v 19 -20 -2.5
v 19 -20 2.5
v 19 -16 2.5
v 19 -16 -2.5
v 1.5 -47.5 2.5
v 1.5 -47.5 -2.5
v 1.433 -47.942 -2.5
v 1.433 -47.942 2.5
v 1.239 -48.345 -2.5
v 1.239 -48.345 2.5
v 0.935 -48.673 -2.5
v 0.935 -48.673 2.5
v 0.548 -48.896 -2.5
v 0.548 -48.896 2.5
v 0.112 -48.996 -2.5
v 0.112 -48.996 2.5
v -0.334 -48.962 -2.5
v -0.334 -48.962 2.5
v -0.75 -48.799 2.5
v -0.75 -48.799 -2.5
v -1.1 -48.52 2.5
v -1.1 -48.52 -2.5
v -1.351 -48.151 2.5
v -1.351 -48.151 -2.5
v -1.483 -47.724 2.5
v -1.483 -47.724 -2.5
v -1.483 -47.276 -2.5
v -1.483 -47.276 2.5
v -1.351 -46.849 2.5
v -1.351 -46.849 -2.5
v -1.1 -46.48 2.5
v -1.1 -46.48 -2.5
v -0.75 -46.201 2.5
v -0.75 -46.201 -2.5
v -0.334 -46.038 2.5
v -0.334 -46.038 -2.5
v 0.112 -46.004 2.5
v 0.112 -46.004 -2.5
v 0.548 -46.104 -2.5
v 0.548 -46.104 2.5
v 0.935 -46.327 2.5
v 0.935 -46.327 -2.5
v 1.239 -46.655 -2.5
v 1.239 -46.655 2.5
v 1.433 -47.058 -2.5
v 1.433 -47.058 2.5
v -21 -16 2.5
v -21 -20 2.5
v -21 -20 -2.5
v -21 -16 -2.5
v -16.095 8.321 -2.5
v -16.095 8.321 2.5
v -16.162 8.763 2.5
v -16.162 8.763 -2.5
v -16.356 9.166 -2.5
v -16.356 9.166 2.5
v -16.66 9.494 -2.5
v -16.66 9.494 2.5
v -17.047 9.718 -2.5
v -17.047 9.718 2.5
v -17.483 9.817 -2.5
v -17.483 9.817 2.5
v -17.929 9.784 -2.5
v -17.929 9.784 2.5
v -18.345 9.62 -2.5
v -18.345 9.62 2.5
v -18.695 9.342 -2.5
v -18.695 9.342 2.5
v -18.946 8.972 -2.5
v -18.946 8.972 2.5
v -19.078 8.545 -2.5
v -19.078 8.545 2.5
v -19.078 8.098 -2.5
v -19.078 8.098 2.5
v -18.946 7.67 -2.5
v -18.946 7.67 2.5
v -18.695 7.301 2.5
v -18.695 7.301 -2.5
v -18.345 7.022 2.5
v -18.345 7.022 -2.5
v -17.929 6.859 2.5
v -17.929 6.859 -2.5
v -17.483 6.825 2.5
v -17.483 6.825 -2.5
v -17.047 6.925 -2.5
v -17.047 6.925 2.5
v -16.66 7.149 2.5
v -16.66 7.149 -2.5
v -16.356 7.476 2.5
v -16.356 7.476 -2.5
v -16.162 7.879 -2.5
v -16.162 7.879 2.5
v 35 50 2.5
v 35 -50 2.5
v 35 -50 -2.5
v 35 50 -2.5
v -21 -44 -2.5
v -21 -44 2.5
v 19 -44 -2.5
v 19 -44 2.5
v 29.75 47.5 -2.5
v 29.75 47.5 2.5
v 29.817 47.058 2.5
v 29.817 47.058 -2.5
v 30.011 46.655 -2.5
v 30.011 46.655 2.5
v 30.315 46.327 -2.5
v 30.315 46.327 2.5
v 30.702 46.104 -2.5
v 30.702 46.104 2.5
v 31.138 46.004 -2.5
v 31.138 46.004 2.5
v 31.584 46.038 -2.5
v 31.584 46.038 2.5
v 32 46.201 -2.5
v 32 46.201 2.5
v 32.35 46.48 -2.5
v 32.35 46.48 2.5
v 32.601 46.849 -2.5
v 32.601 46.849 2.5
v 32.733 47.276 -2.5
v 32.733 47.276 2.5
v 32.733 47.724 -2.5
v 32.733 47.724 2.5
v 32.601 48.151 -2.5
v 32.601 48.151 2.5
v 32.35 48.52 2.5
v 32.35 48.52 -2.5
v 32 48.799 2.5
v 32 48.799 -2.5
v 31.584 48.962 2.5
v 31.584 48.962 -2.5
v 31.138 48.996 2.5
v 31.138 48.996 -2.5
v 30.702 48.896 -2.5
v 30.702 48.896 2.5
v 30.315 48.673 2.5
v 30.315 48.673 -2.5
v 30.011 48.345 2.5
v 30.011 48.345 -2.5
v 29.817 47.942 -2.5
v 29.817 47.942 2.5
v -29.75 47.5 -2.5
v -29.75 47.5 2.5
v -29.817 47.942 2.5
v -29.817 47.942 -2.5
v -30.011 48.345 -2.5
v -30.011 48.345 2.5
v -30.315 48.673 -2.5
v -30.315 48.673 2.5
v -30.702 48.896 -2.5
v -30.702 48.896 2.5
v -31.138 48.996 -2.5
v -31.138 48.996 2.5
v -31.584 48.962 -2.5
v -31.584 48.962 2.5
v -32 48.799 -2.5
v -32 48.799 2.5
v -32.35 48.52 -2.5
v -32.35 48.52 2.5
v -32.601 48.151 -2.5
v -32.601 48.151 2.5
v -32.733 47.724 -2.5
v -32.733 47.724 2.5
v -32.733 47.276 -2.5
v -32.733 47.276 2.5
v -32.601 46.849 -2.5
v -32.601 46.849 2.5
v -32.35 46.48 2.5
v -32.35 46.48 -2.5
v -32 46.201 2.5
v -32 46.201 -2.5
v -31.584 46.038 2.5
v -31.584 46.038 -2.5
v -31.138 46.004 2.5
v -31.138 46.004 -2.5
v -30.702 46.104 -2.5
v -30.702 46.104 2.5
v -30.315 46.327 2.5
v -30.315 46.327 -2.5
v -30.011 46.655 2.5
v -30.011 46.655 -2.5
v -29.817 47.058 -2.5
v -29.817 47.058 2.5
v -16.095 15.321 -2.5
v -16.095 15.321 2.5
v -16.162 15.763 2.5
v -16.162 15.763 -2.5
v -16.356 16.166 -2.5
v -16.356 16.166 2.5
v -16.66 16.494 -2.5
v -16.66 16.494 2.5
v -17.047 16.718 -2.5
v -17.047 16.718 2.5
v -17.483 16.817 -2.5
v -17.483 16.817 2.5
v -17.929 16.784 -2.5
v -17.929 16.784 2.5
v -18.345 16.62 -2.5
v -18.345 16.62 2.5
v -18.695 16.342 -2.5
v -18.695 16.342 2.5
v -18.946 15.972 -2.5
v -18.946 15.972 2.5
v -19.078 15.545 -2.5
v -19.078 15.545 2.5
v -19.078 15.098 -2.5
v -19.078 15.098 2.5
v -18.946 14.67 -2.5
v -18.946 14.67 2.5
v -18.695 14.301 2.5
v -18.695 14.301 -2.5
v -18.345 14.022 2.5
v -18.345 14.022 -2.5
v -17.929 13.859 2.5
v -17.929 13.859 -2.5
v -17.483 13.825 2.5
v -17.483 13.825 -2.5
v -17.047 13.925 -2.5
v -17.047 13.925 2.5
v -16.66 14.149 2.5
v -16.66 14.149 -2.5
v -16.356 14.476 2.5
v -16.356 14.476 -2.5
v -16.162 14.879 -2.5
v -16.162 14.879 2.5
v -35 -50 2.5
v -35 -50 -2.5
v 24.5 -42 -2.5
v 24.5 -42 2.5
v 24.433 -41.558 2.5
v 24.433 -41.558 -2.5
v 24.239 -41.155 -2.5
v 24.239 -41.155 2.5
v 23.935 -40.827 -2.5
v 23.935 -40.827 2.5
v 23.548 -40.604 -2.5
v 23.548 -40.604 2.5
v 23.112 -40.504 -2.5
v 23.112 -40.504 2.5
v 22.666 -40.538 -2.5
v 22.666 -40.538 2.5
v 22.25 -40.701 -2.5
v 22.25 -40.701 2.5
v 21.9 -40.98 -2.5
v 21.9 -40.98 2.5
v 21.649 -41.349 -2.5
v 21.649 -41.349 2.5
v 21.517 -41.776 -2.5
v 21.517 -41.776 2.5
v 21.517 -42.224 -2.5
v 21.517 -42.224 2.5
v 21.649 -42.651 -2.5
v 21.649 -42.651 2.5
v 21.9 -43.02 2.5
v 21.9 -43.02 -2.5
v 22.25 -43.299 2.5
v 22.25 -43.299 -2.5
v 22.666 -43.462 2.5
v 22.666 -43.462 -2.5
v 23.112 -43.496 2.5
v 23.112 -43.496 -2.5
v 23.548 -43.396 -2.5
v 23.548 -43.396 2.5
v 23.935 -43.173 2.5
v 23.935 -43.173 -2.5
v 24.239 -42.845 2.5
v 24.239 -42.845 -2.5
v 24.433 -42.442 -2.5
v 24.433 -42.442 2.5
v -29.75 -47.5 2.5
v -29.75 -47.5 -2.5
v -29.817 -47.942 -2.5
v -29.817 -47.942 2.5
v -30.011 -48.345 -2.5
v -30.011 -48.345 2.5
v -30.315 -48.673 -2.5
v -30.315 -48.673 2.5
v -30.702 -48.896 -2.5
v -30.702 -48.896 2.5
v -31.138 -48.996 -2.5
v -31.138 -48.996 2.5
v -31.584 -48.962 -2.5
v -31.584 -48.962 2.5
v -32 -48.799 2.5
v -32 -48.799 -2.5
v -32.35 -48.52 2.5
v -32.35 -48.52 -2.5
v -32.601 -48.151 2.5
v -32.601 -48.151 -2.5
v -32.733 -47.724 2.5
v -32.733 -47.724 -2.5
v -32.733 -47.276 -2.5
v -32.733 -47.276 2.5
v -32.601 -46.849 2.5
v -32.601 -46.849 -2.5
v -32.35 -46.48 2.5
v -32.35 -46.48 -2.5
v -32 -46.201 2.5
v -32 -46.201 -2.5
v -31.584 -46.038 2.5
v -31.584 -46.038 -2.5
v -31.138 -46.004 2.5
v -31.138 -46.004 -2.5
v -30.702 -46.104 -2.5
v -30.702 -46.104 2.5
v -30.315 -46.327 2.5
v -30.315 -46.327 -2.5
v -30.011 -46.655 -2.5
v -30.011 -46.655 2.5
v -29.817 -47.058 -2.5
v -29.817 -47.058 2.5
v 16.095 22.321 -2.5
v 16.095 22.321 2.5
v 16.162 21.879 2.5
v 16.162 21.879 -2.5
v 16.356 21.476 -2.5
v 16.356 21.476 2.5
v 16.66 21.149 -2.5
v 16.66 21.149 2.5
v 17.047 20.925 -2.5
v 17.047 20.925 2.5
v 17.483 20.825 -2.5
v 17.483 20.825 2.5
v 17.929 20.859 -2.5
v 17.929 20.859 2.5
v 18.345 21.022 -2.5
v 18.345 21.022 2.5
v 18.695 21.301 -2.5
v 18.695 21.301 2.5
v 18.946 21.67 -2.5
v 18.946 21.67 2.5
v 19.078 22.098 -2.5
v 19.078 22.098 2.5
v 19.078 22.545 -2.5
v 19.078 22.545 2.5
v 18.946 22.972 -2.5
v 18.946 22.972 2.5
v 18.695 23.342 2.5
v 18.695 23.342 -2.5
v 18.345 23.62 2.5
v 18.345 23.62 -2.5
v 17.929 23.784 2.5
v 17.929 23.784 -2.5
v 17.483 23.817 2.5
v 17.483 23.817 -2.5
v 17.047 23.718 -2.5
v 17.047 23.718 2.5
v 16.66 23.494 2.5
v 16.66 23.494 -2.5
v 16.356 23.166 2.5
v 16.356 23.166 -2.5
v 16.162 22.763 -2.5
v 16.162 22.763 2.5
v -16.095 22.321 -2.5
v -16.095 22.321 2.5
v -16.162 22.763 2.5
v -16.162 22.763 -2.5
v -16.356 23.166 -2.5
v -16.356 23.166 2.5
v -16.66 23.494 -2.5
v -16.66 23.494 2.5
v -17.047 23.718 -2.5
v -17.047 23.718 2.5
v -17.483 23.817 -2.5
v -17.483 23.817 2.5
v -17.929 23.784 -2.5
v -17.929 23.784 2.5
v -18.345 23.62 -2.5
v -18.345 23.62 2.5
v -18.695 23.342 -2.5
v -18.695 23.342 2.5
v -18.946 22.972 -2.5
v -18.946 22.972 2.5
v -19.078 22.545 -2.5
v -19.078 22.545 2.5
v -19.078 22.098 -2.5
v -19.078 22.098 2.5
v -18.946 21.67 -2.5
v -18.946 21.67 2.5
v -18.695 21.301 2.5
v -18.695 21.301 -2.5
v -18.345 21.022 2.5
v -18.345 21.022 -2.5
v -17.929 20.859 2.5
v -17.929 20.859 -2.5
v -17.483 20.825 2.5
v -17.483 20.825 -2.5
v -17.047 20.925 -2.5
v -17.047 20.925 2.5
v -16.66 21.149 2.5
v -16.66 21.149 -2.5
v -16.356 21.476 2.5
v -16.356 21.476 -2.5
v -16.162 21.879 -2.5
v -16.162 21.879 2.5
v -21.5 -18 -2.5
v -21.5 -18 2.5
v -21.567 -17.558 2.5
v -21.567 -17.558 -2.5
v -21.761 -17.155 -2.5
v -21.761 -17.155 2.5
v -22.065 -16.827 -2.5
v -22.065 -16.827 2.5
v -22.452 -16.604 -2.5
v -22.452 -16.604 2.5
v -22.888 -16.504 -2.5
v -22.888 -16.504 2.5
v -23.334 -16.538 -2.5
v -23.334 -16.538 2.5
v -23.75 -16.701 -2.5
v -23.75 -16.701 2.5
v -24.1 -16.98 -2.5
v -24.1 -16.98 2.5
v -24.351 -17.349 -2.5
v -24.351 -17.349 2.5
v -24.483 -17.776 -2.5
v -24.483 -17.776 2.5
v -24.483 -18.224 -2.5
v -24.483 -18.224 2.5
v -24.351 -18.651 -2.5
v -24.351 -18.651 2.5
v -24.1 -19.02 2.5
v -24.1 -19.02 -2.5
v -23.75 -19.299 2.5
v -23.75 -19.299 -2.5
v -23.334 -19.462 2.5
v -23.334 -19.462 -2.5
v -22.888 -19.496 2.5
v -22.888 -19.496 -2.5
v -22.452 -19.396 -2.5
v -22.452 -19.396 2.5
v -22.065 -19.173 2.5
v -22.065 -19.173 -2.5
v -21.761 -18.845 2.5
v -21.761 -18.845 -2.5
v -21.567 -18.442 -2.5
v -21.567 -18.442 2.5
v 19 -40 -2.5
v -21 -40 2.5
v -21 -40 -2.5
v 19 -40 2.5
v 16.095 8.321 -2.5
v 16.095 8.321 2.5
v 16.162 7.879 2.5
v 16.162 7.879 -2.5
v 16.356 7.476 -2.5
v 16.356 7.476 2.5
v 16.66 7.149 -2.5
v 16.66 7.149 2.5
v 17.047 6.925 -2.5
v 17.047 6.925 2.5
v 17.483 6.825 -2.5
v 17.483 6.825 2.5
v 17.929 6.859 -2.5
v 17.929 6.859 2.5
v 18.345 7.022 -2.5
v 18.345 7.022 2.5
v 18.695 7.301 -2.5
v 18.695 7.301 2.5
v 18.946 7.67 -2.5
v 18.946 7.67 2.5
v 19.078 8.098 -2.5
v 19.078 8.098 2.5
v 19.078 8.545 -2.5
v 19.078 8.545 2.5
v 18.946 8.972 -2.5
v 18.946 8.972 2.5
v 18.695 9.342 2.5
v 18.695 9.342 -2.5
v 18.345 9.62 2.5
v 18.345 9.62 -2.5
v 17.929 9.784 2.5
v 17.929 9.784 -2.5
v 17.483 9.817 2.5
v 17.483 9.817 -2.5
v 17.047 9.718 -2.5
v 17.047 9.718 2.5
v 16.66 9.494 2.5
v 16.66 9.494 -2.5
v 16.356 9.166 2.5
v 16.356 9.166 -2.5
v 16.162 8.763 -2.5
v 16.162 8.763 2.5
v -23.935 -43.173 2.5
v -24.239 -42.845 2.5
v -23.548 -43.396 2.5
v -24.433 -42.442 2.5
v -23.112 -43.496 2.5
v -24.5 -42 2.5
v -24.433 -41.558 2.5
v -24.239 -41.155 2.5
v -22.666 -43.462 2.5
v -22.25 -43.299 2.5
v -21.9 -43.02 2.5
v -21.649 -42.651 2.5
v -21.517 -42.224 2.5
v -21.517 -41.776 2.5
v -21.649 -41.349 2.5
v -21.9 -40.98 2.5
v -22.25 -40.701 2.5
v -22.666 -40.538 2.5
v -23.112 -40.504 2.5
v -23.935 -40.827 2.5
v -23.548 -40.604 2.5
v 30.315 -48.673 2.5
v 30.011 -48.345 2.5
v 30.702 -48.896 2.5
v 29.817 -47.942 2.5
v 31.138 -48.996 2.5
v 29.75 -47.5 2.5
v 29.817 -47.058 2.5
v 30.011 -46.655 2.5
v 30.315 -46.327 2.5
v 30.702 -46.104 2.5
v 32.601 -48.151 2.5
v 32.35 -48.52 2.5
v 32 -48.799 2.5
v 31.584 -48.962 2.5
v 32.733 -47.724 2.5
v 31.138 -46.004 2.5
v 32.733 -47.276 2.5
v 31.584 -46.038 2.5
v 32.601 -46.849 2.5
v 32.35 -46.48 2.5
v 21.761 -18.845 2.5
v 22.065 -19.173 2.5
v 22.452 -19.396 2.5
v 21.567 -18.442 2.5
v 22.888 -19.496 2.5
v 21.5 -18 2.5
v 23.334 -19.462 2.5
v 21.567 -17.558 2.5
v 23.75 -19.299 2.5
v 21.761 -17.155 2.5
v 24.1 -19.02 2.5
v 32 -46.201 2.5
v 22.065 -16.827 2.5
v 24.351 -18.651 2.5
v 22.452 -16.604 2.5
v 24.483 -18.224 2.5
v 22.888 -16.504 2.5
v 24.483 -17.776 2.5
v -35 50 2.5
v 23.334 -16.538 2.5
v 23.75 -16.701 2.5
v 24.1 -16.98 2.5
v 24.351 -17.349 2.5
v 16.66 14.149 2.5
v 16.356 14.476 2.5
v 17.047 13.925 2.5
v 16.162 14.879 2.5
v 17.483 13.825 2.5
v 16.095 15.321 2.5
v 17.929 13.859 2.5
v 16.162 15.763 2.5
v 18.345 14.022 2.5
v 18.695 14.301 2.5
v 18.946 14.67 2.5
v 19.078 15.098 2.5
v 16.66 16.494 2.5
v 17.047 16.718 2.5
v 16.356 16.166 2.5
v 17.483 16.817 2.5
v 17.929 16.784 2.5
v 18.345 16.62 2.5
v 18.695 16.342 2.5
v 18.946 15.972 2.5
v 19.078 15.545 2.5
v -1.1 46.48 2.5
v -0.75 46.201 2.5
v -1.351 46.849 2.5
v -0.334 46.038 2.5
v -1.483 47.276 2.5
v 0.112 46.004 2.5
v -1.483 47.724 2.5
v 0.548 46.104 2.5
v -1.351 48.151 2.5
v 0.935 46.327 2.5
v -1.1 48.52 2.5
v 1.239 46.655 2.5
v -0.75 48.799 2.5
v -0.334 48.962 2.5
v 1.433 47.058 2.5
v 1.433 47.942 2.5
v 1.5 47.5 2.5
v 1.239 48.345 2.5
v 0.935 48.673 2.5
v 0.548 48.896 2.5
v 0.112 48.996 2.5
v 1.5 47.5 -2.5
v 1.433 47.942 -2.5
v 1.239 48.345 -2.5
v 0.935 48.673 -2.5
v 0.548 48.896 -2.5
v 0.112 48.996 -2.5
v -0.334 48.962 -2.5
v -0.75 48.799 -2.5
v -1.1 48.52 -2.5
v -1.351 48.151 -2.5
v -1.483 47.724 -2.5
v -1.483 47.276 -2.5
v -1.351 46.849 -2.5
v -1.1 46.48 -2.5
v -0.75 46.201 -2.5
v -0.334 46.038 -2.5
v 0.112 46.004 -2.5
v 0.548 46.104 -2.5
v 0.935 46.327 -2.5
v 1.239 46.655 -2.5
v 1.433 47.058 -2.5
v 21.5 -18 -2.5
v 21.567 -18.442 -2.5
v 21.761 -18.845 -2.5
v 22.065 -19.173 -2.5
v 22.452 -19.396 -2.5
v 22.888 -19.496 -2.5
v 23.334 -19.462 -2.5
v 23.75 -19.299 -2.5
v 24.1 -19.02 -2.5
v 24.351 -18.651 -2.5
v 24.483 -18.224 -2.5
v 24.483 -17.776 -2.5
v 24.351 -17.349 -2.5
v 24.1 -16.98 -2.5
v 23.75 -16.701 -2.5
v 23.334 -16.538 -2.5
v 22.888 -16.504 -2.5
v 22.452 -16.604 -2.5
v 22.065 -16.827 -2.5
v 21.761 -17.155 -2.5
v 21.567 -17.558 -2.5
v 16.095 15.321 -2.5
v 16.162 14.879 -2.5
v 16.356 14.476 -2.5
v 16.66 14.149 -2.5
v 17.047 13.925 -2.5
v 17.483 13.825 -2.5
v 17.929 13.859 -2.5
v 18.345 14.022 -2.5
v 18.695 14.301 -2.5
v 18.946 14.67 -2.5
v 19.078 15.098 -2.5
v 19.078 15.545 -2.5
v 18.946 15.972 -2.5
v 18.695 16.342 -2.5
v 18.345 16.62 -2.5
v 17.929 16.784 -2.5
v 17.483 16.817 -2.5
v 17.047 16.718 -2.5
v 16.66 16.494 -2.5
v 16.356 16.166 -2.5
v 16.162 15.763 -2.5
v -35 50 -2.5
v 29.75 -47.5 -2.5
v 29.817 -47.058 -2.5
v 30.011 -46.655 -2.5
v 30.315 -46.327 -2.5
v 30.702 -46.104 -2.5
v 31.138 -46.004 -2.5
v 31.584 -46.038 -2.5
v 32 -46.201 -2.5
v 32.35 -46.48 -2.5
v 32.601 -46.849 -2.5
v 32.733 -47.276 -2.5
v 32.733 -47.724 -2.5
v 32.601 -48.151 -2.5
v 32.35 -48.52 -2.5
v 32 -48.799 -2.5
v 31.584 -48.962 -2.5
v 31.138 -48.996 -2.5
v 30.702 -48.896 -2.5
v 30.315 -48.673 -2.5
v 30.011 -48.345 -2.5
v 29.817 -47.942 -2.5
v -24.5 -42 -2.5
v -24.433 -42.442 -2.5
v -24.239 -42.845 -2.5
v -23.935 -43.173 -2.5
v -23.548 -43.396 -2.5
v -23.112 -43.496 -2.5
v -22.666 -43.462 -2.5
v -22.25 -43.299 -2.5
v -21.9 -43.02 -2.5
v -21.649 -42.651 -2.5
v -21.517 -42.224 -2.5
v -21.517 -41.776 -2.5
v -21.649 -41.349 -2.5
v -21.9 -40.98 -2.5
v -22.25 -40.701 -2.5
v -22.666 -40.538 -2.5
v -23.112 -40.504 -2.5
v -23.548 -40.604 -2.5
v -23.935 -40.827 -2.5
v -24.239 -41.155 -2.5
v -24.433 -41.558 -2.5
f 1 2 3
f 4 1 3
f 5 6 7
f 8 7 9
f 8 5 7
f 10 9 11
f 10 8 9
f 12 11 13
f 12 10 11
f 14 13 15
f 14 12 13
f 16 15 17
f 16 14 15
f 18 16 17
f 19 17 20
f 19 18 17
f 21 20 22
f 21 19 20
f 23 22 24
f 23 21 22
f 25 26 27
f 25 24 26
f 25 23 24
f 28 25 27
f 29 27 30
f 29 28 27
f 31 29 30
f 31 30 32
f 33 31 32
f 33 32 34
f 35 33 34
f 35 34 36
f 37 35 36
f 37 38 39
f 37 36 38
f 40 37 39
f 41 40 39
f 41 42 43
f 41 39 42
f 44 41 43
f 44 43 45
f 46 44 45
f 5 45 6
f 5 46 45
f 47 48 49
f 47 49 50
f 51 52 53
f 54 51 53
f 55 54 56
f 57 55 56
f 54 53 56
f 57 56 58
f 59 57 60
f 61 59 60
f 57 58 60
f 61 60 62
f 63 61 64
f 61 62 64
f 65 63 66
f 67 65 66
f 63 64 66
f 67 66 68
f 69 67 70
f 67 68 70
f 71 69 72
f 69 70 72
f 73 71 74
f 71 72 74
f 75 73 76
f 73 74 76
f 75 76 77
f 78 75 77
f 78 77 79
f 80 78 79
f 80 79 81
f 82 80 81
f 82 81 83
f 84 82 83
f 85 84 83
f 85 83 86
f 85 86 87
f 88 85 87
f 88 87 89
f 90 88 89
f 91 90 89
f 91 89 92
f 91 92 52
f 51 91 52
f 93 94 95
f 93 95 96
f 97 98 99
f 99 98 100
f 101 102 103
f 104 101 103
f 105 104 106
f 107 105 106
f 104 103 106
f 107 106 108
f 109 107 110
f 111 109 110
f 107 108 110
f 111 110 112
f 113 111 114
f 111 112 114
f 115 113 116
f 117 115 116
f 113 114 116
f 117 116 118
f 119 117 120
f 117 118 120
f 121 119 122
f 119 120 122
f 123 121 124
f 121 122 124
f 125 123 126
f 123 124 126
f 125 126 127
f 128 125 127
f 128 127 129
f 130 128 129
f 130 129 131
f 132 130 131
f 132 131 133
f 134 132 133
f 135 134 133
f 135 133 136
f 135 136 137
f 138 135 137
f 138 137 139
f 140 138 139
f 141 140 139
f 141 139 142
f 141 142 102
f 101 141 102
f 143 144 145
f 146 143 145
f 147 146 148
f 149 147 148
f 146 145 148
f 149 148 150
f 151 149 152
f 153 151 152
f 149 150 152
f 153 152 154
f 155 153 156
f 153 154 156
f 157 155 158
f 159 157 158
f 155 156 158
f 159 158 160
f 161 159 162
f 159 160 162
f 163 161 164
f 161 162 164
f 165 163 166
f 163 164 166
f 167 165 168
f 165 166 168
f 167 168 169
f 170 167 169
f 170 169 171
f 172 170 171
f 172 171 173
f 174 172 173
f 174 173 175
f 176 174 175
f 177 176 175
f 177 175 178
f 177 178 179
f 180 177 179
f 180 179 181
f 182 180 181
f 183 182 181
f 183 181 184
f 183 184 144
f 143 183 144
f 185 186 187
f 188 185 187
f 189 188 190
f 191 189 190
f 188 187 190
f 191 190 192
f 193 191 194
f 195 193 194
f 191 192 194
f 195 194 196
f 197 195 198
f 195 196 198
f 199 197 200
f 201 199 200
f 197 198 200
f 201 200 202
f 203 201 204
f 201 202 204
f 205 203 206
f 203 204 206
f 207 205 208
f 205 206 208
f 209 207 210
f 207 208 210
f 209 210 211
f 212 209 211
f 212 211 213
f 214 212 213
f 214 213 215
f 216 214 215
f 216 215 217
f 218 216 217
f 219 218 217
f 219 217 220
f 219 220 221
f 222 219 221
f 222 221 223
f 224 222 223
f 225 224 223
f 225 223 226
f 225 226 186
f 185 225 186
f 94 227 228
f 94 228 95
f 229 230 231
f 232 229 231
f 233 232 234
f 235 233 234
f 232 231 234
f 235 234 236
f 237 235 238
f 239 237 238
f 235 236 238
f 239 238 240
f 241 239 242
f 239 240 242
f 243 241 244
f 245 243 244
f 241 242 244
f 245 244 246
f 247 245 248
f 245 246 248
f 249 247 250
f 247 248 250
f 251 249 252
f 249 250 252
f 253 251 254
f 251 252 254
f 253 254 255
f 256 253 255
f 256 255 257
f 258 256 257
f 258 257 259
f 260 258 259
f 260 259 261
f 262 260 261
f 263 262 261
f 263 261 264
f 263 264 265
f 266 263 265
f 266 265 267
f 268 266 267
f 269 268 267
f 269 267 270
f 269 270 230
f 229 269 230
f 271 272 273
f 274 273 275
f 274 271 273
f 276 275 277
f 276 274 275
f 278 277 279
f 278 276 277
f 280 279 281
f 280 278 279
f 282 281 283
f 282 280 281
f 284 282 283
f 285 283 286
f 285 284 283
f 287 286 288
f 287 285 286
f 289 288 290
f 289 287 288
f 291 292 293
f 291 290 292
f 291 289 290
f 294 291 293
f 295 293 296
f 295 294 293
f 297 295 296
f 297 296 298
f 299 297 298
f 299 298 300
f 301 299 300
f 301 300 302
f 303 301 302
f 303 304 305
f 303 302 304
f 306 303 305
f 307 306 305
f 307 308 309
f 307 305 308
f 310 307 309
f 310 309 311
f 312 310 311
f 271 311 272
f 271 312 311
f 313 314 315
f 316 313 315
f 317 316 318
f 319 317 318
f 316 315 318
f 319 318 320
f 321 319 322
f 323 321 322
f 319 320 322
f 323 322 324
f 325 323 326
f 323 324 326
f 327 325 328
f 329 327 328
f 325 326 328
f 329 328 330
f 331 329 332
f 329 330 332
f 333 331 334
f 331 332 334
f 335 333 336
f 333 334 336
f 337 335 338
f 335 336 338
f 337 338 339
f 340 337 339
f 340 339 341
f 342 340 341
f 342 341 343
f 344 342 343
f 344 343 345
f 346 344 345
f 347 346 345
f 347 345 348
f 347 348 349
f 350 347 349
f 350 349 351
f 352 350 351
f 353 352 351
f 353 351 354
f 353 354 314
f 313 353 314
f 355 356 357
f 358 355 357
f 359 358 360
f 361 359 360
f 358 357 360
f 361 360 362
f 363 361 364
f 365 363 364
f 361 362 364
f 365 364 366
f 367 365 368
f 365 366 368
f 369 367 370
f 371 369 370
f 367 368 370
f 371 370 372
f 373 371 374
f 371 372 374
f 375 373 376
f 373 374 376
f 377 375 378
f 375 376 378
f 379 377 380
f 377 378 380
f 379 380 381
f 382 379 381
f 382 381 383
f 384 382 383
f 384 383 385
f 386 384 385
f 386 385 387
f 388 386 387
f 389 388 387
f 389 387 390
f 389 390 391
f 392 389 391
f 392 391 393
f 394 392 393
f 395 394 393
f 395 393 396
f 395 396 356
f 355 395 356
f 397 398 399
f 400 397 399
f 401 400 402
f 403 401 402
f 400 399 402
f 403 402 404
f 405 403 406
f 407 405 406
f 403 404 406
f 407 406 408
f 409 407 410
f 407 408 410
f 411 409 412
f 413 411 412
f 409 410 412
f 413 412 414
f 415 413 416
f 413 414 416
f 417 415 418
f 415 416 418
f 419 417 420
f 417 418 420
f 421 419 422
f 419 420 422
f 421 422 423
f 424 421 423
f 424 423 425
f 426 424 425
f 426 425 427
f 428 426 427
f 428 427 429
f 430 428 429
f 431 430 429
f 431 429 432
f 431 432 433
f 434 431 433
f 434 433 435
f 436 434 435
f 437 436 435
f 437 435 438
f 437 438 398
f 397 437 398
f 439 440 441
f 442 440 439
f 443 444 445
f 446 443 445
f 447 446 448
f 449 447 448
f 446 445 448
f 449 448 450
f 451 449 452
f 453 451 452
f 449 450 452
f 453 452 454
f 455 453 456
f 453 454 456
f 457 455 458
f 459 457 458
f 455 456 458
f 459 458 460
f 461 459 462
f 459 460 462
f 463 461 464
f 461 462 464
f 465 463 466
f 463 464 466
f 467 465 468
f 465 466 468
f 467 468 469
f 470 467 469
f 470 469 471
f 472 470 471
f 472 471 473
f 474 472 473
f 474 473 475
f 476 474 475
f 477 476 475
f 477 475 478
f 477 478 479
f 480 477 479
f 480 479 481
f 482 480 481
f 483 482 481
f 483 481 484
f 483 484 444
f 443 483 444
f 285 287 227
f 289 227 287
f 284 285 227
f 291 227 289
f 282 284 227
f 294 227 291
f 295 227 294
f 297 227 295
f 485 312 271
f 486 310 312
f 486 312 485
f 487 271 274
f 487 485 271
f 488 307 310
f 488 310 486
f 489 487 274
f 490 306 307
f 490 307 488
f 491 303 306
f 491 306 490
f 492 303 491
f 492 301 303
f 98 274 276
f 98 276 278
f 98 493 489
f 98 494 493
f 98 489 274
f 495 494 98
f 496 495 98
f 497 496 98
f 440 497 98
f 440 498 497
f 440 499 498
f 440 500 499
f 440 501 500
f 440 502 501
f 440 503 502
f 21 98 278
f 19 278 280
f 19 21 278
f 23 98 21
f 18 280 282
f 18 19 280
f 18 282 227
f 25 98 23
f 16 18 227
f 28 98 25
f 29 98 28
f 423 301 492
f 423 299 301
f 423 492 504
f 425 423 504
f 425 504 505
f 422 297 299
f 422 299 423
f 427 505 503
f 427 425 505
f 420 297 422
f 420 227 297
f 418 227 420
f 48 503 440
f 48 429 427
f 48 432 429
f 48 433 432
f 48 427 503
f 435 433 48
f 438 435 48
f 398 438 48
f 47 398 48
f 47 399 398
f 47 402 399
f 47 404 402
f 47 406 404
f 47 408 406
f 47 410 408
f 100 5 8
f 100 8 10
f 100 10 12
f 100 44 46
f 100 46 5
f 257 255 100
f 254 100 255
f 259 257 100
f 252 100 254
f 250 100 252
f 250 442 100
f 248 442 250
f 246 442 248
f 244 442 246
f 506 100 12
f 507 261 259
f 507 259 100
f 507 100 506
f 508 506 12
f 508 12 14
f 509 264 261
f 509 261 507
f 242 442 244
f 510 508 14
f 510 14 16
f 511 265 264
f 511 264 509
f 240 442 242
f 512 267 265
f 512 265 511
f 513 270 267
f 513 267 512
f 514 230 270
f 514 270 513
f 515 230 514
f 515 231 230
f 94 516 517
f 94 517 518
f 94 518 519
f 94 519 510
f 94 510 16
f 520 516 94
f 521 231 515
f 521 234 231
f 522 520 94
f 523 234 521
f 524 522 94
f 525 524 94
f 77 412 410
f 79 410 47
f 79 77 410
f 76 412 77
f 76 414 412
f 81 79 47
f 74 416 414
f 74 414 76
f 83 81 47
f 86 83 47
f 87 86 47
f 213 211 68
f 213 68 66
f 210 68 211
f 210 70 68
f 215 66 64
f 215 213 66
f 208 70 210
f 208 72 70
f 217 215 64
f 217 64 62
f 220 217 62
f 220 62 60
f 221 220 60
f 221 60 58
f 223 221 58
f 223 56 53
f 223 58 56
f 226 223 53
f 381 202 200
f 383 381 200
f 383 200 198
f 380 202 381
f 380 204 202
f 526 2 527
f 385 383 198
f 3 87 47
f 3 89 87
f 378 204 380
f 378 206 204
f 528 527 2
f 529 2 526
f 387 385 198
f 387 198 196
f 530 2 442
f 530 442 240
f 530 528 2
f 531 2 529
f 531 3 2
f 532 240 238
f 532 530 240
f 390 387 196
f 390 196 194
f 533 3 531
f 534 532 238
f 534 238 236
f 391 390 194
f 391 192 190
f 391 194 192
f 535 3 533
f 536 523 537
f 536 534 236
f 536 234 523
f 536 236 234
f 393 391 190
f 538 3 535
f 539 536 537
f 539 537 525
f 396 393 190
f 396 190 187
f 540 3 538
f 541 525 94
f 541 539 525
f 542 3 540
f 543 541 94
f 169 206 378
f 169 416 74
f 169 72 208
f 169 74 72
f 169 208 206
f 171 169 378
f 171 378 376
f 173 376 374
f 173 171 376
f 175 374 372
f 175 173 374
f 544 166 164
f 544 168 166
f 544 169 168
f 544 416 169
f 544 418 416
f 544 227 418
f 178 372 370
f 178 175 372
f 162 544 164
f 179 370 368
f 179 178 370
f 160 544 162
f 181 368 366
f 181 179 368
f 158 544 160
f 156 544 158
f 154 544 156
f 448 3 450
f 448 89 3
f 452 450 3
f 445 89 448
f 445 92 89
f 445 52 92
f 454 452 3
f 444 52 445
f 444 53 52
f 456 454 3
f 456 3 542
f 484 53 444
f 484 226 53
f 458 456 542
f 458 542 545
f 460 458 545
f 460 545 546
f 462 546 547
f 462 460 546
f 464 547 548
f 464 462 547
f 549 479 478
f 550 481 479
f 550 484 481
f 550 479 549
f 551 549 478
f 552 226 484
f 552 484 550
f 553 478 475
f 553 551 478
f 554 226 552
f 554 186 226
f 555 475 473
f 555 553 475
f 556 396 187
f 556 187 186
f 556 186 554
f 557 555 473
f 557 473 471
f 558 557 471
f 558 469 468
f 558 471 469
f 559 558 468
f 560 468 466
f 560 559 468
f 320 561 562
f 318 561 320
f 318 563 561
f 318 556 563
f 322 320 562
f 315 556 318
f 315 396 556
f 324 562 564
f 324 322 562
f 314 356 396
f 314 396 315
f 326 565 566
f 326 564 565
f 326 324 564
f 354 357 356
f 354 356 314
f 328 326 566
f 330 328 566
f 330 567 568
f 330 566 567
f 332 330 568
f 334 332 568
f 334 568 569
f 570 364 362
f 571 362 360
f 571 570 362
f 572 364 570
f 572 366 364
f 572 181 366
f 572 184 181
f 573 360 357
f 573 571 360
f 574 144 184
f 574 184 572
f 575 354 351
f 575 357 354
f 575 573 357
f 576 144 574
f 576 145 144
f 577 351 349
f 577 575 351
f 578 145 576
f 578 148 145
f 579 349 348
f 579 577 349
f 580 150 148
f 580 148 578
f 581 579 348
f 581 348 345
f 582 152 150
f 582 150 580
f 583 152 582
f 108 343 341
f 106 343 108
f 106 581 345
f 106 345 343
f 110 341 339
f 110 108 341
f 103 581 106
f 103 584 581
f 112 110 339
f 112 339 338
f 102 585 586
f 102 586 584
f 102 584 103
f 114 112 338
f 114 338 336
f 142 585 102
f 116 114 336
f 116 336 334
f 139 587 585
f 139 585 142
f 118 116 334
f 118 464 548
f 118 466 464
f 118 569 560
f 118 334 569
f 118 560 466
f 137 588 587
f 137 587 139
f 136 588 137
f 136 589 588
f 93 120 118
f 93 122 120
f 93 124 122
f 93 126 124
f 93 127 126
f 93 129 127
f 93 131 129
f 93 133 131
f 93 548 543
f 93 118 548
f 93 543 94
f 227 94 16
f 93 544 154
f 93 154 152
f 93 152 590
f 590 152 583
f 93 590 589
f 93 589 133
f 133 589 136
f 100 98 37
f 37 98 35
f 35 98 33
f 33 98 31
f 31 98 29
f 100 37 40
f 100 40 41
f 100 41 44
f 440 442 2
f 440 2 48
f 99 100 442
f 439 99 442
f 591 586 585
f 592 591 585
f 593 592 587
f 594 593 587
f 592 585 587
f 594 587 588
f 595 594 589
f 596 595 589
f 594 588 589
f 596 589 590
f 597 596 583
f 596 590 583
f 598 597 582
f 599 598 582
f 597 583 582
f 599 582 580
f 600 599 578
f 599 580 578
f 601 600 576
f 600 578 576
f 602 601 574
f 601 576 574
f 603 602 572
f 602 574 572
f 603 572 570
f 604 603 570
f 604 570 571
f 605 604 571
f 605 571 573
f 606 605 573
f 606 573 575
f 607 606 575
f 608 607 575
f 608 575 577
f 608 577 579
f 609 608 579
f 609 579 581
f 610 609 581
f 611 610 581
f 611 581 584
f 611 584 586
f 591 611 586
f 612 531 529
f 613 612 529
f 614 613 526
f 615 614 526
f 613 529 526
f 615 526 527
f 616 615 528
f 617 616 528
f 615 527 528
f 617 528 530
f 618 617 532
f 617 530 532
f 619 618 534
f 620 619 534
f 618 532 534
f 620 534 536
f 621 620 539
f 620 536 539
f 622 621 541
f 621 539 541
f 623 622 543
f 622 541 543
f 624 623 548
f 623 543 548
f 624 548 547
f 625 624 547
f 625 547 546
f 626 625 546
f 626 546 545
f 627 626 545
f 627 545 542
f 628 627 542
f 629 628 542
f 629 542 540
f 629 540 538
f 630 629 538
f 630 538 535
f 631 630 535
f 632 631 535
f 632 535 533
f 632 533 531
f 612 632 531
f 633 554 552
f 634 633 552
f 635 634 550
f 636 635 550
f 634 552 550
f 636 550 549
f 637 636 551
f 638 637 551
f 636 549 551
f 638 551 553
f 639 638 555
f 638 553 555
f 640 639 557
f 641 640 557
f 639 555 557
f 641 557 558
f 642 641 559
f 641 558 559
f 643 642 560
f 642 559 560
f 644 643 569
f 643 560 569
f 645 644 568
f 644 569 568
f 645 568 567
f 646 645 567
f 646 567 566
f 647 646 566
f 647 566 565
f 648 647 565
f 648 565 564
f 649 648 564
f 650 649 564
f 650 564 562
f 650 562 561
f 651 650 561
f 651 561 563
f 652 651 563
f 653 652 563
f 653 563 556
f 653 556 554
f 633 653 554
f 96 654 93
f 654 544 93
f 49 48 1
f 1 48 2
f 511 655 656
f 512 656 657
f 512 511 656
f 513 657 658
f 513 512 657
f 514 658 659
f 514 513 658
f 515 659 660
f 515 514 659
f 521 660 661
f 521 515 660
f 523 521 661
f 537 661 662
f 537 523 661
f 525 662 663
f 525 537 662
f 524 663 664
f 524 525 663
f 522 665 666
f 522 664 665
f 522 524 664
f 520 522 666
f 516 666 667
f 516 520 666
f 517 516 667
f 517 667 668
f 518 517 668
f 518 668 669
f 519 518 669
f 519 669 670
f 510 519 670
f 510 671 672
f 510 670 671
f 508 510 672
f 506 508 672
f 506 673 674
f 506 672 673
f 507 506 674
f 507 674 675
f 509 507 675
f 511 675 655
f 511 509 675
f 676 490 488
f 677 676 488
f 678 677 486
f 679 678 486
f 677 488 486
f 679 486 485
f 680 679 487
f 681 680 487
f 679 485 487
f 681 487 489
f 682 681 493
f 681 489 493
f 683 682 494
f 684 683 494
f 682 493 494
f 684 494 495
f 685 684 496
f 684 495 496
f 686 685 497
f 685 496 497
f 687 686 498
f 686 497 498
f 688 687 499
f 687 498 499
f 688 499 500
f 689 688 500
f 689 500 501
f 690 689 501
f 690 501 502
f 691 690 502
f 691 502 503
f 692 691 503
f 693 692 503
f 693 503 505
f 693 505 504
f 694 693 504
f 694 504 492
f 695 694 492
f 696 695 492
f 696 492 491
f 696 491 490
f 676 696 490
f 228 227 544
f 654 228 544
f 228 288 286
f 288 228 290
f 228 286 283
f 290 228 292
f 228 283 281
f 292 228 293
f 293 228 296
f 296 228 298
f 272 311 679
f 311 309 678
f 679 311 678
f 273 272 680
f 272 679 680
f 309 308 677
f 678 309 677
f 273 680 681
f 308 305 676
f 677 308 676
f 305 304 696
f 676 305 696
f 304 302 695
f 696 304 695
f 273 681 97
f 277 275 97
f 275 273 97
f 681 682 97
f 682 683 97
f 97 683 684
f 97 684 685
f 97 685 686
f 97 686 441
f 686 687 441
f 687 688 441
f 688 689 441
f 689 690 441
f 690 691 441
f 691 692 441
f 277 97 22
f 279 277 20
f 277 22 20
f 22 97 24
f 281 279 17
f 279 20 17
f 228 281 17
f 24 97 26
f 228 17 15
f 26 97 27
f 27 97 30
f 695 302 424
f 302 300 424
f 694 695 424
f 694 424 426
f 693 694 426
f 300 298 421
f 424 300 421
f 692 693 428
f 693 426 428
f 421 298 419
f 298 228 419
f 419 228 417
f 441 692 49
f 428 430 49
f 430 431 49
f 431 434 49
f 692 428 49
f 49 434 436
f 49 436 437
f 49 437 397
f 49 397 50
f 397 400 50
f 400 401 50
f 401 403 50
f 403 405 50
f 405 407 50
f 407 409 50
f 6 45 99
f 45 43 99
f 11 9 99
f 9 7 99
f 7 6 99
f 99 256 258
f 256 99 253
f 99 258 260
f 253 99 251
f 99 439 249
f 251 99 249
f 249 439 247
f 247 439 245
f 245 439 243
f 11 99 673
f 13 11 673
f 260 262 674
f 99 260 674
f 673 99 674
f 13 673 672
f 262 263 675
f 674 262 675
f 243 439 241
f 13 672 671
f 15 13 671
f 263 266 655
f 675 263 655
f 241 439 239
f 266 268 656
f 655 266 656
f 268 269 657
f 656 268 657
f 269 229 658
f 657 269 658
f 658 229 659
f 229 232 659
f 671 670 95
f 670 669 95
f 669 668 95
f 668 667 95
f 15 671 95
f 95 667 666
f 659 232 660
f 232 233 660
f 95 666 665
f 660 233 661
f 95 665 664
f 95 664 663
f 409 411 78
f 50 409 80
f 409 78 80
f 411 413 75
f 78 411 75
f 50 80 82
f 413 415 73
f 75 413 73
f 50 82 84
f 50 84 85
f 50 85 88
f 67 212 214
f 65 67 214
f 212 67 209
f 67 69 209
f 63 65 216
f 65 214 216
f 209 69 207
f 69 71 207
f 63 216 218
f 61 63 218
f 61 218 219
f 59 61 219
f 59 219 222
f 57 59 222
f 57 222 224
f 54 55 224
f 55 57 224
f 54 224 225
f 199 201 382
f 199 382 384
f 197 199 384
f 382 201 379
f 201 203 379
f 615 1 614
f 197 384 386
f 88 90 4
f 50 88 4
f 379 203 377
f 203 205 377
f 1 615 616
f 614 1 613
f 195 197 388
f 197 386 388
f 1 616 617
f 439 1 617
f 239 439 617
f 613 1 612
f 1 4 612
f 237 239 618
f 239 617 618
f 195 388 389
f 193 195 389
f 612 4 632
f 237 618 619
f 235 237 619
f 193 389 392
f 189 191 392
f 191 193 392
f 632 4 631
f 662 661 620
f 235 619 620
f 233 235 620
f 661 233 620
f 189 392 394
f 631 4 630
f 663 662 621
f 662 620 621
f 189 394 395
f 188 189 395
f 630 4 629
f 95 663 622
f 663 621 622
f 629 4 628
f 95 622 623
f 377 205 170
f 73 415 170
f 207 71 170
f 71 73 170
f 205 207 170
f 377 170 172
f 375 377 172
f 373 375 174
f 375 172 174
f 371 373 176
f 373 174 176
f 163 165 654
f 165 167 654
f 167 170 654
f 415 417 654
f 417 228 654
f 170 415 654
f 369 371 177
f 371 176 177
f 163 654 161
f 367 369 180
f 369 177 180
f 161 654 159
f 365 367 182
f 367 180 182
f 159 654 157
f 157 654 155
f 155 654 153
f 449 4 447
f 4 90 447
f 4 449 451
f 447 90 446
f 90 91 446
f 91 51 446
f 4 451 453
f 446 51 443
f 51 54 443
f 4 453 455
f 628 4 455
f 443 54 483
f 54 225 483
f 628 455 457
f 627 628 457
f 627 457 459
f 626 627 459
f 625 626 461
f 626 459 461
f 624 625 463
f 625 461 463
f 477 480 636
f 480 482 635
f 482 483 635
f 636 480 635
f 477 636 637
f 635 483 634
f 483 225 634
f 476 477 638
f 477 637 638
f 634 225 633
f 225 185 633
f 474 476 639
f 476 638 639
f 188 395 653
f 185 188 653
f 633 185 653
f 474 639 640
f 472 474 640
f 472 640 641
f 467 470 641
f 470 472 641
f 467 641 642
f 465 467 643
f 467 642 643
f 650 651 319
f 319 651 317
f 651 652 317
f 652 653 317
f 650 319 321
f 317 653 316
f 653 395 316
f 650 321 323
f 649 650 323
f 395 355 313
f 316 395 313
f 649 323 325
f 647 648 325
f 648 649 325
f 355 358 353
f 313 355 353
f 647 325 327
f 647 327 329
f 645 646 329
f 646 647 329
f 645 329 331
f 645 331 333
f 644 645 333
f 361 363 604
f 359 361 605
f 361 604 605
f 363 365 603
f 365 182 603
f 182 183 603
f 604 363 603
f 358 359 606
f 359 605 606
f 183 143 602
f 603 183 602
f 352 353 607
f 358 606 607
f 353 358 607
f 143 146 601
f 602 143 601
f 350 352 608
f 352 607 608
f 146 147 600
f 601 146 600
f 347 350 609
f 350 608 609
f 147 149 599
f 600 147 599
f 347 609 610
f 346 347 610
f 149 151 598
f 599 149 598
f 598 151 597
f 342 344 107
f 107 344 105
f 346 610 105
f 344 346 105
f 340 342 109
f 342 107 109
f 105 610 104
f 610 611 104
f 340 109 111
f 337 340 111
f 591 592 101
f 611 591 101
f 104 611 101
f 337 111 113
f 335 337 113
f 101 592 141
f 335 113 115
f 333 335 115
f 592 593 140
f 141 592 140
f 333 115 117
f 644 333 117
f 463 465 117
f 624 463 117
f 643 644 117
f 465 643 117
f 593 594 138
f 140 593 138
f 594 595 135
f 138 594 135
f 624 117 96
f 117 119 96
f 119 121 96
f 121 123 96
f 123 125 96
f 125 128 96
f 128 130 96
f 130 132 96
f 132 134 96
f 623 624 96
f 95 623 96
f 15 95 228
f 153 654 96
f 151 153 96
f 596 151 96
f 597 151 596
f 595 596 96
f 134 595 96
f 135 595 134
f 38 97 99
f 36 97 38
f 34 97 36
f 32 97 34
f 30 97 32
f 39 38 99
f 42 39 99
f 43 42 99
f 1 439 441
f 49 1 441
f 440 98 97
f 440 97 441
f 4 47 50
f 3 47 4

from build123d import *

# Parameters (mm, degrees)
SKETCH1_W           = 70
SKETCH1_H           = 100
BOSS_EXTRUDE1_DEPTH = 2.5
SKETCH2_R           = 1.5
CUT_EXTRUDE1_DEPTH  = 11
SKETCH3_R           = 1.5
SKETCH3_W           = 40
SKETCH3_H           = 4
CUT_EXTRUDE2_DEPTH  = 10


with BuildPart() as part:
    # Sketch1 → Boss-Extrude1 (new, symmetric)
    with BuildSketch(Plane.XY):
        Rectangle(SKETCH1_W, SKETCH1_H)
    extrude(amount=BOSS_EXTRUDE1_DEPTH, both=True)

    # Sketch2 → Cut-Extrude1 (cut)
    with BuildSketch(Plane.XY.offset(2.5)):
        with Locations((0, 47.5)):
            Circle(SKETCH2_R)
        with Locations((-31.25, 47.5)):
            Circle(SKETCH2_R)
        with Locations(Location((31.25, 47.5, 0), (0, 0, 180))):
            Circle(SKETCH2_R)
    cut_extrude1 = extrude(amount=-CUT_EXTRUDE1_DEPTH, mode=Mode.SUBTRACT)

    # Mirror1: Cut-Extrude1 across plane
    add(cut_extrude1.mirror(Plane.ZX), mode=Mode.SUBTRACT)

    # Sketch3 → Cut-Extrude2 (cut)
    with BuildSketch(Plane.XY.offset(2.5)):
        with Locations((-17.594978519, 15.321286244)):
            Circle(SKETCH3_R)
        with Locations((-17.594978519, 22.321286244)):
            Circle(SKETCH3_R)
        with Locations((-17.594978519, 8.321286244)):
            Circle(SKETCH3_R)
        with Locations(Location((17.594978519, 8.321286244, 0), (0, 0, 180))):
            Circle(SKETCH3_R)
        with Locations(Location((17.594978519, 15.321286244, 0), (0, 0, 180))):
            Circle(SKETCH3_R)
        with Locations(Location((17.594978519, 22.321286244, 0), (0, 0, 180))):
            Circle(SKETCH3_R)
        with Locations((-23, -18)):
            Circle(SKETCH3_R)
        with Locations(Location((23, -18, 0), (0, 0, 180))):
            Circle(SKETCH3_R)
        with Locations((23, -42)):
            Circle(SKETCH3_R)
        with Locations(Location((-23, -42, 0), (0, 0, 180))):
            Circle(SKETCH3_R)
        with Locations((-1, -42)):
            Rectangle(SKETCH3_W, SKETCH3_H)
        with Locations((-1, -18)):
            Rectangle(SKETCH3_W, SKETCH3_H)
    extrude(amount=-CUT_EXTRUDE2_DEPTH, mode=Mode.SUBTRACT)


solid = part.part
